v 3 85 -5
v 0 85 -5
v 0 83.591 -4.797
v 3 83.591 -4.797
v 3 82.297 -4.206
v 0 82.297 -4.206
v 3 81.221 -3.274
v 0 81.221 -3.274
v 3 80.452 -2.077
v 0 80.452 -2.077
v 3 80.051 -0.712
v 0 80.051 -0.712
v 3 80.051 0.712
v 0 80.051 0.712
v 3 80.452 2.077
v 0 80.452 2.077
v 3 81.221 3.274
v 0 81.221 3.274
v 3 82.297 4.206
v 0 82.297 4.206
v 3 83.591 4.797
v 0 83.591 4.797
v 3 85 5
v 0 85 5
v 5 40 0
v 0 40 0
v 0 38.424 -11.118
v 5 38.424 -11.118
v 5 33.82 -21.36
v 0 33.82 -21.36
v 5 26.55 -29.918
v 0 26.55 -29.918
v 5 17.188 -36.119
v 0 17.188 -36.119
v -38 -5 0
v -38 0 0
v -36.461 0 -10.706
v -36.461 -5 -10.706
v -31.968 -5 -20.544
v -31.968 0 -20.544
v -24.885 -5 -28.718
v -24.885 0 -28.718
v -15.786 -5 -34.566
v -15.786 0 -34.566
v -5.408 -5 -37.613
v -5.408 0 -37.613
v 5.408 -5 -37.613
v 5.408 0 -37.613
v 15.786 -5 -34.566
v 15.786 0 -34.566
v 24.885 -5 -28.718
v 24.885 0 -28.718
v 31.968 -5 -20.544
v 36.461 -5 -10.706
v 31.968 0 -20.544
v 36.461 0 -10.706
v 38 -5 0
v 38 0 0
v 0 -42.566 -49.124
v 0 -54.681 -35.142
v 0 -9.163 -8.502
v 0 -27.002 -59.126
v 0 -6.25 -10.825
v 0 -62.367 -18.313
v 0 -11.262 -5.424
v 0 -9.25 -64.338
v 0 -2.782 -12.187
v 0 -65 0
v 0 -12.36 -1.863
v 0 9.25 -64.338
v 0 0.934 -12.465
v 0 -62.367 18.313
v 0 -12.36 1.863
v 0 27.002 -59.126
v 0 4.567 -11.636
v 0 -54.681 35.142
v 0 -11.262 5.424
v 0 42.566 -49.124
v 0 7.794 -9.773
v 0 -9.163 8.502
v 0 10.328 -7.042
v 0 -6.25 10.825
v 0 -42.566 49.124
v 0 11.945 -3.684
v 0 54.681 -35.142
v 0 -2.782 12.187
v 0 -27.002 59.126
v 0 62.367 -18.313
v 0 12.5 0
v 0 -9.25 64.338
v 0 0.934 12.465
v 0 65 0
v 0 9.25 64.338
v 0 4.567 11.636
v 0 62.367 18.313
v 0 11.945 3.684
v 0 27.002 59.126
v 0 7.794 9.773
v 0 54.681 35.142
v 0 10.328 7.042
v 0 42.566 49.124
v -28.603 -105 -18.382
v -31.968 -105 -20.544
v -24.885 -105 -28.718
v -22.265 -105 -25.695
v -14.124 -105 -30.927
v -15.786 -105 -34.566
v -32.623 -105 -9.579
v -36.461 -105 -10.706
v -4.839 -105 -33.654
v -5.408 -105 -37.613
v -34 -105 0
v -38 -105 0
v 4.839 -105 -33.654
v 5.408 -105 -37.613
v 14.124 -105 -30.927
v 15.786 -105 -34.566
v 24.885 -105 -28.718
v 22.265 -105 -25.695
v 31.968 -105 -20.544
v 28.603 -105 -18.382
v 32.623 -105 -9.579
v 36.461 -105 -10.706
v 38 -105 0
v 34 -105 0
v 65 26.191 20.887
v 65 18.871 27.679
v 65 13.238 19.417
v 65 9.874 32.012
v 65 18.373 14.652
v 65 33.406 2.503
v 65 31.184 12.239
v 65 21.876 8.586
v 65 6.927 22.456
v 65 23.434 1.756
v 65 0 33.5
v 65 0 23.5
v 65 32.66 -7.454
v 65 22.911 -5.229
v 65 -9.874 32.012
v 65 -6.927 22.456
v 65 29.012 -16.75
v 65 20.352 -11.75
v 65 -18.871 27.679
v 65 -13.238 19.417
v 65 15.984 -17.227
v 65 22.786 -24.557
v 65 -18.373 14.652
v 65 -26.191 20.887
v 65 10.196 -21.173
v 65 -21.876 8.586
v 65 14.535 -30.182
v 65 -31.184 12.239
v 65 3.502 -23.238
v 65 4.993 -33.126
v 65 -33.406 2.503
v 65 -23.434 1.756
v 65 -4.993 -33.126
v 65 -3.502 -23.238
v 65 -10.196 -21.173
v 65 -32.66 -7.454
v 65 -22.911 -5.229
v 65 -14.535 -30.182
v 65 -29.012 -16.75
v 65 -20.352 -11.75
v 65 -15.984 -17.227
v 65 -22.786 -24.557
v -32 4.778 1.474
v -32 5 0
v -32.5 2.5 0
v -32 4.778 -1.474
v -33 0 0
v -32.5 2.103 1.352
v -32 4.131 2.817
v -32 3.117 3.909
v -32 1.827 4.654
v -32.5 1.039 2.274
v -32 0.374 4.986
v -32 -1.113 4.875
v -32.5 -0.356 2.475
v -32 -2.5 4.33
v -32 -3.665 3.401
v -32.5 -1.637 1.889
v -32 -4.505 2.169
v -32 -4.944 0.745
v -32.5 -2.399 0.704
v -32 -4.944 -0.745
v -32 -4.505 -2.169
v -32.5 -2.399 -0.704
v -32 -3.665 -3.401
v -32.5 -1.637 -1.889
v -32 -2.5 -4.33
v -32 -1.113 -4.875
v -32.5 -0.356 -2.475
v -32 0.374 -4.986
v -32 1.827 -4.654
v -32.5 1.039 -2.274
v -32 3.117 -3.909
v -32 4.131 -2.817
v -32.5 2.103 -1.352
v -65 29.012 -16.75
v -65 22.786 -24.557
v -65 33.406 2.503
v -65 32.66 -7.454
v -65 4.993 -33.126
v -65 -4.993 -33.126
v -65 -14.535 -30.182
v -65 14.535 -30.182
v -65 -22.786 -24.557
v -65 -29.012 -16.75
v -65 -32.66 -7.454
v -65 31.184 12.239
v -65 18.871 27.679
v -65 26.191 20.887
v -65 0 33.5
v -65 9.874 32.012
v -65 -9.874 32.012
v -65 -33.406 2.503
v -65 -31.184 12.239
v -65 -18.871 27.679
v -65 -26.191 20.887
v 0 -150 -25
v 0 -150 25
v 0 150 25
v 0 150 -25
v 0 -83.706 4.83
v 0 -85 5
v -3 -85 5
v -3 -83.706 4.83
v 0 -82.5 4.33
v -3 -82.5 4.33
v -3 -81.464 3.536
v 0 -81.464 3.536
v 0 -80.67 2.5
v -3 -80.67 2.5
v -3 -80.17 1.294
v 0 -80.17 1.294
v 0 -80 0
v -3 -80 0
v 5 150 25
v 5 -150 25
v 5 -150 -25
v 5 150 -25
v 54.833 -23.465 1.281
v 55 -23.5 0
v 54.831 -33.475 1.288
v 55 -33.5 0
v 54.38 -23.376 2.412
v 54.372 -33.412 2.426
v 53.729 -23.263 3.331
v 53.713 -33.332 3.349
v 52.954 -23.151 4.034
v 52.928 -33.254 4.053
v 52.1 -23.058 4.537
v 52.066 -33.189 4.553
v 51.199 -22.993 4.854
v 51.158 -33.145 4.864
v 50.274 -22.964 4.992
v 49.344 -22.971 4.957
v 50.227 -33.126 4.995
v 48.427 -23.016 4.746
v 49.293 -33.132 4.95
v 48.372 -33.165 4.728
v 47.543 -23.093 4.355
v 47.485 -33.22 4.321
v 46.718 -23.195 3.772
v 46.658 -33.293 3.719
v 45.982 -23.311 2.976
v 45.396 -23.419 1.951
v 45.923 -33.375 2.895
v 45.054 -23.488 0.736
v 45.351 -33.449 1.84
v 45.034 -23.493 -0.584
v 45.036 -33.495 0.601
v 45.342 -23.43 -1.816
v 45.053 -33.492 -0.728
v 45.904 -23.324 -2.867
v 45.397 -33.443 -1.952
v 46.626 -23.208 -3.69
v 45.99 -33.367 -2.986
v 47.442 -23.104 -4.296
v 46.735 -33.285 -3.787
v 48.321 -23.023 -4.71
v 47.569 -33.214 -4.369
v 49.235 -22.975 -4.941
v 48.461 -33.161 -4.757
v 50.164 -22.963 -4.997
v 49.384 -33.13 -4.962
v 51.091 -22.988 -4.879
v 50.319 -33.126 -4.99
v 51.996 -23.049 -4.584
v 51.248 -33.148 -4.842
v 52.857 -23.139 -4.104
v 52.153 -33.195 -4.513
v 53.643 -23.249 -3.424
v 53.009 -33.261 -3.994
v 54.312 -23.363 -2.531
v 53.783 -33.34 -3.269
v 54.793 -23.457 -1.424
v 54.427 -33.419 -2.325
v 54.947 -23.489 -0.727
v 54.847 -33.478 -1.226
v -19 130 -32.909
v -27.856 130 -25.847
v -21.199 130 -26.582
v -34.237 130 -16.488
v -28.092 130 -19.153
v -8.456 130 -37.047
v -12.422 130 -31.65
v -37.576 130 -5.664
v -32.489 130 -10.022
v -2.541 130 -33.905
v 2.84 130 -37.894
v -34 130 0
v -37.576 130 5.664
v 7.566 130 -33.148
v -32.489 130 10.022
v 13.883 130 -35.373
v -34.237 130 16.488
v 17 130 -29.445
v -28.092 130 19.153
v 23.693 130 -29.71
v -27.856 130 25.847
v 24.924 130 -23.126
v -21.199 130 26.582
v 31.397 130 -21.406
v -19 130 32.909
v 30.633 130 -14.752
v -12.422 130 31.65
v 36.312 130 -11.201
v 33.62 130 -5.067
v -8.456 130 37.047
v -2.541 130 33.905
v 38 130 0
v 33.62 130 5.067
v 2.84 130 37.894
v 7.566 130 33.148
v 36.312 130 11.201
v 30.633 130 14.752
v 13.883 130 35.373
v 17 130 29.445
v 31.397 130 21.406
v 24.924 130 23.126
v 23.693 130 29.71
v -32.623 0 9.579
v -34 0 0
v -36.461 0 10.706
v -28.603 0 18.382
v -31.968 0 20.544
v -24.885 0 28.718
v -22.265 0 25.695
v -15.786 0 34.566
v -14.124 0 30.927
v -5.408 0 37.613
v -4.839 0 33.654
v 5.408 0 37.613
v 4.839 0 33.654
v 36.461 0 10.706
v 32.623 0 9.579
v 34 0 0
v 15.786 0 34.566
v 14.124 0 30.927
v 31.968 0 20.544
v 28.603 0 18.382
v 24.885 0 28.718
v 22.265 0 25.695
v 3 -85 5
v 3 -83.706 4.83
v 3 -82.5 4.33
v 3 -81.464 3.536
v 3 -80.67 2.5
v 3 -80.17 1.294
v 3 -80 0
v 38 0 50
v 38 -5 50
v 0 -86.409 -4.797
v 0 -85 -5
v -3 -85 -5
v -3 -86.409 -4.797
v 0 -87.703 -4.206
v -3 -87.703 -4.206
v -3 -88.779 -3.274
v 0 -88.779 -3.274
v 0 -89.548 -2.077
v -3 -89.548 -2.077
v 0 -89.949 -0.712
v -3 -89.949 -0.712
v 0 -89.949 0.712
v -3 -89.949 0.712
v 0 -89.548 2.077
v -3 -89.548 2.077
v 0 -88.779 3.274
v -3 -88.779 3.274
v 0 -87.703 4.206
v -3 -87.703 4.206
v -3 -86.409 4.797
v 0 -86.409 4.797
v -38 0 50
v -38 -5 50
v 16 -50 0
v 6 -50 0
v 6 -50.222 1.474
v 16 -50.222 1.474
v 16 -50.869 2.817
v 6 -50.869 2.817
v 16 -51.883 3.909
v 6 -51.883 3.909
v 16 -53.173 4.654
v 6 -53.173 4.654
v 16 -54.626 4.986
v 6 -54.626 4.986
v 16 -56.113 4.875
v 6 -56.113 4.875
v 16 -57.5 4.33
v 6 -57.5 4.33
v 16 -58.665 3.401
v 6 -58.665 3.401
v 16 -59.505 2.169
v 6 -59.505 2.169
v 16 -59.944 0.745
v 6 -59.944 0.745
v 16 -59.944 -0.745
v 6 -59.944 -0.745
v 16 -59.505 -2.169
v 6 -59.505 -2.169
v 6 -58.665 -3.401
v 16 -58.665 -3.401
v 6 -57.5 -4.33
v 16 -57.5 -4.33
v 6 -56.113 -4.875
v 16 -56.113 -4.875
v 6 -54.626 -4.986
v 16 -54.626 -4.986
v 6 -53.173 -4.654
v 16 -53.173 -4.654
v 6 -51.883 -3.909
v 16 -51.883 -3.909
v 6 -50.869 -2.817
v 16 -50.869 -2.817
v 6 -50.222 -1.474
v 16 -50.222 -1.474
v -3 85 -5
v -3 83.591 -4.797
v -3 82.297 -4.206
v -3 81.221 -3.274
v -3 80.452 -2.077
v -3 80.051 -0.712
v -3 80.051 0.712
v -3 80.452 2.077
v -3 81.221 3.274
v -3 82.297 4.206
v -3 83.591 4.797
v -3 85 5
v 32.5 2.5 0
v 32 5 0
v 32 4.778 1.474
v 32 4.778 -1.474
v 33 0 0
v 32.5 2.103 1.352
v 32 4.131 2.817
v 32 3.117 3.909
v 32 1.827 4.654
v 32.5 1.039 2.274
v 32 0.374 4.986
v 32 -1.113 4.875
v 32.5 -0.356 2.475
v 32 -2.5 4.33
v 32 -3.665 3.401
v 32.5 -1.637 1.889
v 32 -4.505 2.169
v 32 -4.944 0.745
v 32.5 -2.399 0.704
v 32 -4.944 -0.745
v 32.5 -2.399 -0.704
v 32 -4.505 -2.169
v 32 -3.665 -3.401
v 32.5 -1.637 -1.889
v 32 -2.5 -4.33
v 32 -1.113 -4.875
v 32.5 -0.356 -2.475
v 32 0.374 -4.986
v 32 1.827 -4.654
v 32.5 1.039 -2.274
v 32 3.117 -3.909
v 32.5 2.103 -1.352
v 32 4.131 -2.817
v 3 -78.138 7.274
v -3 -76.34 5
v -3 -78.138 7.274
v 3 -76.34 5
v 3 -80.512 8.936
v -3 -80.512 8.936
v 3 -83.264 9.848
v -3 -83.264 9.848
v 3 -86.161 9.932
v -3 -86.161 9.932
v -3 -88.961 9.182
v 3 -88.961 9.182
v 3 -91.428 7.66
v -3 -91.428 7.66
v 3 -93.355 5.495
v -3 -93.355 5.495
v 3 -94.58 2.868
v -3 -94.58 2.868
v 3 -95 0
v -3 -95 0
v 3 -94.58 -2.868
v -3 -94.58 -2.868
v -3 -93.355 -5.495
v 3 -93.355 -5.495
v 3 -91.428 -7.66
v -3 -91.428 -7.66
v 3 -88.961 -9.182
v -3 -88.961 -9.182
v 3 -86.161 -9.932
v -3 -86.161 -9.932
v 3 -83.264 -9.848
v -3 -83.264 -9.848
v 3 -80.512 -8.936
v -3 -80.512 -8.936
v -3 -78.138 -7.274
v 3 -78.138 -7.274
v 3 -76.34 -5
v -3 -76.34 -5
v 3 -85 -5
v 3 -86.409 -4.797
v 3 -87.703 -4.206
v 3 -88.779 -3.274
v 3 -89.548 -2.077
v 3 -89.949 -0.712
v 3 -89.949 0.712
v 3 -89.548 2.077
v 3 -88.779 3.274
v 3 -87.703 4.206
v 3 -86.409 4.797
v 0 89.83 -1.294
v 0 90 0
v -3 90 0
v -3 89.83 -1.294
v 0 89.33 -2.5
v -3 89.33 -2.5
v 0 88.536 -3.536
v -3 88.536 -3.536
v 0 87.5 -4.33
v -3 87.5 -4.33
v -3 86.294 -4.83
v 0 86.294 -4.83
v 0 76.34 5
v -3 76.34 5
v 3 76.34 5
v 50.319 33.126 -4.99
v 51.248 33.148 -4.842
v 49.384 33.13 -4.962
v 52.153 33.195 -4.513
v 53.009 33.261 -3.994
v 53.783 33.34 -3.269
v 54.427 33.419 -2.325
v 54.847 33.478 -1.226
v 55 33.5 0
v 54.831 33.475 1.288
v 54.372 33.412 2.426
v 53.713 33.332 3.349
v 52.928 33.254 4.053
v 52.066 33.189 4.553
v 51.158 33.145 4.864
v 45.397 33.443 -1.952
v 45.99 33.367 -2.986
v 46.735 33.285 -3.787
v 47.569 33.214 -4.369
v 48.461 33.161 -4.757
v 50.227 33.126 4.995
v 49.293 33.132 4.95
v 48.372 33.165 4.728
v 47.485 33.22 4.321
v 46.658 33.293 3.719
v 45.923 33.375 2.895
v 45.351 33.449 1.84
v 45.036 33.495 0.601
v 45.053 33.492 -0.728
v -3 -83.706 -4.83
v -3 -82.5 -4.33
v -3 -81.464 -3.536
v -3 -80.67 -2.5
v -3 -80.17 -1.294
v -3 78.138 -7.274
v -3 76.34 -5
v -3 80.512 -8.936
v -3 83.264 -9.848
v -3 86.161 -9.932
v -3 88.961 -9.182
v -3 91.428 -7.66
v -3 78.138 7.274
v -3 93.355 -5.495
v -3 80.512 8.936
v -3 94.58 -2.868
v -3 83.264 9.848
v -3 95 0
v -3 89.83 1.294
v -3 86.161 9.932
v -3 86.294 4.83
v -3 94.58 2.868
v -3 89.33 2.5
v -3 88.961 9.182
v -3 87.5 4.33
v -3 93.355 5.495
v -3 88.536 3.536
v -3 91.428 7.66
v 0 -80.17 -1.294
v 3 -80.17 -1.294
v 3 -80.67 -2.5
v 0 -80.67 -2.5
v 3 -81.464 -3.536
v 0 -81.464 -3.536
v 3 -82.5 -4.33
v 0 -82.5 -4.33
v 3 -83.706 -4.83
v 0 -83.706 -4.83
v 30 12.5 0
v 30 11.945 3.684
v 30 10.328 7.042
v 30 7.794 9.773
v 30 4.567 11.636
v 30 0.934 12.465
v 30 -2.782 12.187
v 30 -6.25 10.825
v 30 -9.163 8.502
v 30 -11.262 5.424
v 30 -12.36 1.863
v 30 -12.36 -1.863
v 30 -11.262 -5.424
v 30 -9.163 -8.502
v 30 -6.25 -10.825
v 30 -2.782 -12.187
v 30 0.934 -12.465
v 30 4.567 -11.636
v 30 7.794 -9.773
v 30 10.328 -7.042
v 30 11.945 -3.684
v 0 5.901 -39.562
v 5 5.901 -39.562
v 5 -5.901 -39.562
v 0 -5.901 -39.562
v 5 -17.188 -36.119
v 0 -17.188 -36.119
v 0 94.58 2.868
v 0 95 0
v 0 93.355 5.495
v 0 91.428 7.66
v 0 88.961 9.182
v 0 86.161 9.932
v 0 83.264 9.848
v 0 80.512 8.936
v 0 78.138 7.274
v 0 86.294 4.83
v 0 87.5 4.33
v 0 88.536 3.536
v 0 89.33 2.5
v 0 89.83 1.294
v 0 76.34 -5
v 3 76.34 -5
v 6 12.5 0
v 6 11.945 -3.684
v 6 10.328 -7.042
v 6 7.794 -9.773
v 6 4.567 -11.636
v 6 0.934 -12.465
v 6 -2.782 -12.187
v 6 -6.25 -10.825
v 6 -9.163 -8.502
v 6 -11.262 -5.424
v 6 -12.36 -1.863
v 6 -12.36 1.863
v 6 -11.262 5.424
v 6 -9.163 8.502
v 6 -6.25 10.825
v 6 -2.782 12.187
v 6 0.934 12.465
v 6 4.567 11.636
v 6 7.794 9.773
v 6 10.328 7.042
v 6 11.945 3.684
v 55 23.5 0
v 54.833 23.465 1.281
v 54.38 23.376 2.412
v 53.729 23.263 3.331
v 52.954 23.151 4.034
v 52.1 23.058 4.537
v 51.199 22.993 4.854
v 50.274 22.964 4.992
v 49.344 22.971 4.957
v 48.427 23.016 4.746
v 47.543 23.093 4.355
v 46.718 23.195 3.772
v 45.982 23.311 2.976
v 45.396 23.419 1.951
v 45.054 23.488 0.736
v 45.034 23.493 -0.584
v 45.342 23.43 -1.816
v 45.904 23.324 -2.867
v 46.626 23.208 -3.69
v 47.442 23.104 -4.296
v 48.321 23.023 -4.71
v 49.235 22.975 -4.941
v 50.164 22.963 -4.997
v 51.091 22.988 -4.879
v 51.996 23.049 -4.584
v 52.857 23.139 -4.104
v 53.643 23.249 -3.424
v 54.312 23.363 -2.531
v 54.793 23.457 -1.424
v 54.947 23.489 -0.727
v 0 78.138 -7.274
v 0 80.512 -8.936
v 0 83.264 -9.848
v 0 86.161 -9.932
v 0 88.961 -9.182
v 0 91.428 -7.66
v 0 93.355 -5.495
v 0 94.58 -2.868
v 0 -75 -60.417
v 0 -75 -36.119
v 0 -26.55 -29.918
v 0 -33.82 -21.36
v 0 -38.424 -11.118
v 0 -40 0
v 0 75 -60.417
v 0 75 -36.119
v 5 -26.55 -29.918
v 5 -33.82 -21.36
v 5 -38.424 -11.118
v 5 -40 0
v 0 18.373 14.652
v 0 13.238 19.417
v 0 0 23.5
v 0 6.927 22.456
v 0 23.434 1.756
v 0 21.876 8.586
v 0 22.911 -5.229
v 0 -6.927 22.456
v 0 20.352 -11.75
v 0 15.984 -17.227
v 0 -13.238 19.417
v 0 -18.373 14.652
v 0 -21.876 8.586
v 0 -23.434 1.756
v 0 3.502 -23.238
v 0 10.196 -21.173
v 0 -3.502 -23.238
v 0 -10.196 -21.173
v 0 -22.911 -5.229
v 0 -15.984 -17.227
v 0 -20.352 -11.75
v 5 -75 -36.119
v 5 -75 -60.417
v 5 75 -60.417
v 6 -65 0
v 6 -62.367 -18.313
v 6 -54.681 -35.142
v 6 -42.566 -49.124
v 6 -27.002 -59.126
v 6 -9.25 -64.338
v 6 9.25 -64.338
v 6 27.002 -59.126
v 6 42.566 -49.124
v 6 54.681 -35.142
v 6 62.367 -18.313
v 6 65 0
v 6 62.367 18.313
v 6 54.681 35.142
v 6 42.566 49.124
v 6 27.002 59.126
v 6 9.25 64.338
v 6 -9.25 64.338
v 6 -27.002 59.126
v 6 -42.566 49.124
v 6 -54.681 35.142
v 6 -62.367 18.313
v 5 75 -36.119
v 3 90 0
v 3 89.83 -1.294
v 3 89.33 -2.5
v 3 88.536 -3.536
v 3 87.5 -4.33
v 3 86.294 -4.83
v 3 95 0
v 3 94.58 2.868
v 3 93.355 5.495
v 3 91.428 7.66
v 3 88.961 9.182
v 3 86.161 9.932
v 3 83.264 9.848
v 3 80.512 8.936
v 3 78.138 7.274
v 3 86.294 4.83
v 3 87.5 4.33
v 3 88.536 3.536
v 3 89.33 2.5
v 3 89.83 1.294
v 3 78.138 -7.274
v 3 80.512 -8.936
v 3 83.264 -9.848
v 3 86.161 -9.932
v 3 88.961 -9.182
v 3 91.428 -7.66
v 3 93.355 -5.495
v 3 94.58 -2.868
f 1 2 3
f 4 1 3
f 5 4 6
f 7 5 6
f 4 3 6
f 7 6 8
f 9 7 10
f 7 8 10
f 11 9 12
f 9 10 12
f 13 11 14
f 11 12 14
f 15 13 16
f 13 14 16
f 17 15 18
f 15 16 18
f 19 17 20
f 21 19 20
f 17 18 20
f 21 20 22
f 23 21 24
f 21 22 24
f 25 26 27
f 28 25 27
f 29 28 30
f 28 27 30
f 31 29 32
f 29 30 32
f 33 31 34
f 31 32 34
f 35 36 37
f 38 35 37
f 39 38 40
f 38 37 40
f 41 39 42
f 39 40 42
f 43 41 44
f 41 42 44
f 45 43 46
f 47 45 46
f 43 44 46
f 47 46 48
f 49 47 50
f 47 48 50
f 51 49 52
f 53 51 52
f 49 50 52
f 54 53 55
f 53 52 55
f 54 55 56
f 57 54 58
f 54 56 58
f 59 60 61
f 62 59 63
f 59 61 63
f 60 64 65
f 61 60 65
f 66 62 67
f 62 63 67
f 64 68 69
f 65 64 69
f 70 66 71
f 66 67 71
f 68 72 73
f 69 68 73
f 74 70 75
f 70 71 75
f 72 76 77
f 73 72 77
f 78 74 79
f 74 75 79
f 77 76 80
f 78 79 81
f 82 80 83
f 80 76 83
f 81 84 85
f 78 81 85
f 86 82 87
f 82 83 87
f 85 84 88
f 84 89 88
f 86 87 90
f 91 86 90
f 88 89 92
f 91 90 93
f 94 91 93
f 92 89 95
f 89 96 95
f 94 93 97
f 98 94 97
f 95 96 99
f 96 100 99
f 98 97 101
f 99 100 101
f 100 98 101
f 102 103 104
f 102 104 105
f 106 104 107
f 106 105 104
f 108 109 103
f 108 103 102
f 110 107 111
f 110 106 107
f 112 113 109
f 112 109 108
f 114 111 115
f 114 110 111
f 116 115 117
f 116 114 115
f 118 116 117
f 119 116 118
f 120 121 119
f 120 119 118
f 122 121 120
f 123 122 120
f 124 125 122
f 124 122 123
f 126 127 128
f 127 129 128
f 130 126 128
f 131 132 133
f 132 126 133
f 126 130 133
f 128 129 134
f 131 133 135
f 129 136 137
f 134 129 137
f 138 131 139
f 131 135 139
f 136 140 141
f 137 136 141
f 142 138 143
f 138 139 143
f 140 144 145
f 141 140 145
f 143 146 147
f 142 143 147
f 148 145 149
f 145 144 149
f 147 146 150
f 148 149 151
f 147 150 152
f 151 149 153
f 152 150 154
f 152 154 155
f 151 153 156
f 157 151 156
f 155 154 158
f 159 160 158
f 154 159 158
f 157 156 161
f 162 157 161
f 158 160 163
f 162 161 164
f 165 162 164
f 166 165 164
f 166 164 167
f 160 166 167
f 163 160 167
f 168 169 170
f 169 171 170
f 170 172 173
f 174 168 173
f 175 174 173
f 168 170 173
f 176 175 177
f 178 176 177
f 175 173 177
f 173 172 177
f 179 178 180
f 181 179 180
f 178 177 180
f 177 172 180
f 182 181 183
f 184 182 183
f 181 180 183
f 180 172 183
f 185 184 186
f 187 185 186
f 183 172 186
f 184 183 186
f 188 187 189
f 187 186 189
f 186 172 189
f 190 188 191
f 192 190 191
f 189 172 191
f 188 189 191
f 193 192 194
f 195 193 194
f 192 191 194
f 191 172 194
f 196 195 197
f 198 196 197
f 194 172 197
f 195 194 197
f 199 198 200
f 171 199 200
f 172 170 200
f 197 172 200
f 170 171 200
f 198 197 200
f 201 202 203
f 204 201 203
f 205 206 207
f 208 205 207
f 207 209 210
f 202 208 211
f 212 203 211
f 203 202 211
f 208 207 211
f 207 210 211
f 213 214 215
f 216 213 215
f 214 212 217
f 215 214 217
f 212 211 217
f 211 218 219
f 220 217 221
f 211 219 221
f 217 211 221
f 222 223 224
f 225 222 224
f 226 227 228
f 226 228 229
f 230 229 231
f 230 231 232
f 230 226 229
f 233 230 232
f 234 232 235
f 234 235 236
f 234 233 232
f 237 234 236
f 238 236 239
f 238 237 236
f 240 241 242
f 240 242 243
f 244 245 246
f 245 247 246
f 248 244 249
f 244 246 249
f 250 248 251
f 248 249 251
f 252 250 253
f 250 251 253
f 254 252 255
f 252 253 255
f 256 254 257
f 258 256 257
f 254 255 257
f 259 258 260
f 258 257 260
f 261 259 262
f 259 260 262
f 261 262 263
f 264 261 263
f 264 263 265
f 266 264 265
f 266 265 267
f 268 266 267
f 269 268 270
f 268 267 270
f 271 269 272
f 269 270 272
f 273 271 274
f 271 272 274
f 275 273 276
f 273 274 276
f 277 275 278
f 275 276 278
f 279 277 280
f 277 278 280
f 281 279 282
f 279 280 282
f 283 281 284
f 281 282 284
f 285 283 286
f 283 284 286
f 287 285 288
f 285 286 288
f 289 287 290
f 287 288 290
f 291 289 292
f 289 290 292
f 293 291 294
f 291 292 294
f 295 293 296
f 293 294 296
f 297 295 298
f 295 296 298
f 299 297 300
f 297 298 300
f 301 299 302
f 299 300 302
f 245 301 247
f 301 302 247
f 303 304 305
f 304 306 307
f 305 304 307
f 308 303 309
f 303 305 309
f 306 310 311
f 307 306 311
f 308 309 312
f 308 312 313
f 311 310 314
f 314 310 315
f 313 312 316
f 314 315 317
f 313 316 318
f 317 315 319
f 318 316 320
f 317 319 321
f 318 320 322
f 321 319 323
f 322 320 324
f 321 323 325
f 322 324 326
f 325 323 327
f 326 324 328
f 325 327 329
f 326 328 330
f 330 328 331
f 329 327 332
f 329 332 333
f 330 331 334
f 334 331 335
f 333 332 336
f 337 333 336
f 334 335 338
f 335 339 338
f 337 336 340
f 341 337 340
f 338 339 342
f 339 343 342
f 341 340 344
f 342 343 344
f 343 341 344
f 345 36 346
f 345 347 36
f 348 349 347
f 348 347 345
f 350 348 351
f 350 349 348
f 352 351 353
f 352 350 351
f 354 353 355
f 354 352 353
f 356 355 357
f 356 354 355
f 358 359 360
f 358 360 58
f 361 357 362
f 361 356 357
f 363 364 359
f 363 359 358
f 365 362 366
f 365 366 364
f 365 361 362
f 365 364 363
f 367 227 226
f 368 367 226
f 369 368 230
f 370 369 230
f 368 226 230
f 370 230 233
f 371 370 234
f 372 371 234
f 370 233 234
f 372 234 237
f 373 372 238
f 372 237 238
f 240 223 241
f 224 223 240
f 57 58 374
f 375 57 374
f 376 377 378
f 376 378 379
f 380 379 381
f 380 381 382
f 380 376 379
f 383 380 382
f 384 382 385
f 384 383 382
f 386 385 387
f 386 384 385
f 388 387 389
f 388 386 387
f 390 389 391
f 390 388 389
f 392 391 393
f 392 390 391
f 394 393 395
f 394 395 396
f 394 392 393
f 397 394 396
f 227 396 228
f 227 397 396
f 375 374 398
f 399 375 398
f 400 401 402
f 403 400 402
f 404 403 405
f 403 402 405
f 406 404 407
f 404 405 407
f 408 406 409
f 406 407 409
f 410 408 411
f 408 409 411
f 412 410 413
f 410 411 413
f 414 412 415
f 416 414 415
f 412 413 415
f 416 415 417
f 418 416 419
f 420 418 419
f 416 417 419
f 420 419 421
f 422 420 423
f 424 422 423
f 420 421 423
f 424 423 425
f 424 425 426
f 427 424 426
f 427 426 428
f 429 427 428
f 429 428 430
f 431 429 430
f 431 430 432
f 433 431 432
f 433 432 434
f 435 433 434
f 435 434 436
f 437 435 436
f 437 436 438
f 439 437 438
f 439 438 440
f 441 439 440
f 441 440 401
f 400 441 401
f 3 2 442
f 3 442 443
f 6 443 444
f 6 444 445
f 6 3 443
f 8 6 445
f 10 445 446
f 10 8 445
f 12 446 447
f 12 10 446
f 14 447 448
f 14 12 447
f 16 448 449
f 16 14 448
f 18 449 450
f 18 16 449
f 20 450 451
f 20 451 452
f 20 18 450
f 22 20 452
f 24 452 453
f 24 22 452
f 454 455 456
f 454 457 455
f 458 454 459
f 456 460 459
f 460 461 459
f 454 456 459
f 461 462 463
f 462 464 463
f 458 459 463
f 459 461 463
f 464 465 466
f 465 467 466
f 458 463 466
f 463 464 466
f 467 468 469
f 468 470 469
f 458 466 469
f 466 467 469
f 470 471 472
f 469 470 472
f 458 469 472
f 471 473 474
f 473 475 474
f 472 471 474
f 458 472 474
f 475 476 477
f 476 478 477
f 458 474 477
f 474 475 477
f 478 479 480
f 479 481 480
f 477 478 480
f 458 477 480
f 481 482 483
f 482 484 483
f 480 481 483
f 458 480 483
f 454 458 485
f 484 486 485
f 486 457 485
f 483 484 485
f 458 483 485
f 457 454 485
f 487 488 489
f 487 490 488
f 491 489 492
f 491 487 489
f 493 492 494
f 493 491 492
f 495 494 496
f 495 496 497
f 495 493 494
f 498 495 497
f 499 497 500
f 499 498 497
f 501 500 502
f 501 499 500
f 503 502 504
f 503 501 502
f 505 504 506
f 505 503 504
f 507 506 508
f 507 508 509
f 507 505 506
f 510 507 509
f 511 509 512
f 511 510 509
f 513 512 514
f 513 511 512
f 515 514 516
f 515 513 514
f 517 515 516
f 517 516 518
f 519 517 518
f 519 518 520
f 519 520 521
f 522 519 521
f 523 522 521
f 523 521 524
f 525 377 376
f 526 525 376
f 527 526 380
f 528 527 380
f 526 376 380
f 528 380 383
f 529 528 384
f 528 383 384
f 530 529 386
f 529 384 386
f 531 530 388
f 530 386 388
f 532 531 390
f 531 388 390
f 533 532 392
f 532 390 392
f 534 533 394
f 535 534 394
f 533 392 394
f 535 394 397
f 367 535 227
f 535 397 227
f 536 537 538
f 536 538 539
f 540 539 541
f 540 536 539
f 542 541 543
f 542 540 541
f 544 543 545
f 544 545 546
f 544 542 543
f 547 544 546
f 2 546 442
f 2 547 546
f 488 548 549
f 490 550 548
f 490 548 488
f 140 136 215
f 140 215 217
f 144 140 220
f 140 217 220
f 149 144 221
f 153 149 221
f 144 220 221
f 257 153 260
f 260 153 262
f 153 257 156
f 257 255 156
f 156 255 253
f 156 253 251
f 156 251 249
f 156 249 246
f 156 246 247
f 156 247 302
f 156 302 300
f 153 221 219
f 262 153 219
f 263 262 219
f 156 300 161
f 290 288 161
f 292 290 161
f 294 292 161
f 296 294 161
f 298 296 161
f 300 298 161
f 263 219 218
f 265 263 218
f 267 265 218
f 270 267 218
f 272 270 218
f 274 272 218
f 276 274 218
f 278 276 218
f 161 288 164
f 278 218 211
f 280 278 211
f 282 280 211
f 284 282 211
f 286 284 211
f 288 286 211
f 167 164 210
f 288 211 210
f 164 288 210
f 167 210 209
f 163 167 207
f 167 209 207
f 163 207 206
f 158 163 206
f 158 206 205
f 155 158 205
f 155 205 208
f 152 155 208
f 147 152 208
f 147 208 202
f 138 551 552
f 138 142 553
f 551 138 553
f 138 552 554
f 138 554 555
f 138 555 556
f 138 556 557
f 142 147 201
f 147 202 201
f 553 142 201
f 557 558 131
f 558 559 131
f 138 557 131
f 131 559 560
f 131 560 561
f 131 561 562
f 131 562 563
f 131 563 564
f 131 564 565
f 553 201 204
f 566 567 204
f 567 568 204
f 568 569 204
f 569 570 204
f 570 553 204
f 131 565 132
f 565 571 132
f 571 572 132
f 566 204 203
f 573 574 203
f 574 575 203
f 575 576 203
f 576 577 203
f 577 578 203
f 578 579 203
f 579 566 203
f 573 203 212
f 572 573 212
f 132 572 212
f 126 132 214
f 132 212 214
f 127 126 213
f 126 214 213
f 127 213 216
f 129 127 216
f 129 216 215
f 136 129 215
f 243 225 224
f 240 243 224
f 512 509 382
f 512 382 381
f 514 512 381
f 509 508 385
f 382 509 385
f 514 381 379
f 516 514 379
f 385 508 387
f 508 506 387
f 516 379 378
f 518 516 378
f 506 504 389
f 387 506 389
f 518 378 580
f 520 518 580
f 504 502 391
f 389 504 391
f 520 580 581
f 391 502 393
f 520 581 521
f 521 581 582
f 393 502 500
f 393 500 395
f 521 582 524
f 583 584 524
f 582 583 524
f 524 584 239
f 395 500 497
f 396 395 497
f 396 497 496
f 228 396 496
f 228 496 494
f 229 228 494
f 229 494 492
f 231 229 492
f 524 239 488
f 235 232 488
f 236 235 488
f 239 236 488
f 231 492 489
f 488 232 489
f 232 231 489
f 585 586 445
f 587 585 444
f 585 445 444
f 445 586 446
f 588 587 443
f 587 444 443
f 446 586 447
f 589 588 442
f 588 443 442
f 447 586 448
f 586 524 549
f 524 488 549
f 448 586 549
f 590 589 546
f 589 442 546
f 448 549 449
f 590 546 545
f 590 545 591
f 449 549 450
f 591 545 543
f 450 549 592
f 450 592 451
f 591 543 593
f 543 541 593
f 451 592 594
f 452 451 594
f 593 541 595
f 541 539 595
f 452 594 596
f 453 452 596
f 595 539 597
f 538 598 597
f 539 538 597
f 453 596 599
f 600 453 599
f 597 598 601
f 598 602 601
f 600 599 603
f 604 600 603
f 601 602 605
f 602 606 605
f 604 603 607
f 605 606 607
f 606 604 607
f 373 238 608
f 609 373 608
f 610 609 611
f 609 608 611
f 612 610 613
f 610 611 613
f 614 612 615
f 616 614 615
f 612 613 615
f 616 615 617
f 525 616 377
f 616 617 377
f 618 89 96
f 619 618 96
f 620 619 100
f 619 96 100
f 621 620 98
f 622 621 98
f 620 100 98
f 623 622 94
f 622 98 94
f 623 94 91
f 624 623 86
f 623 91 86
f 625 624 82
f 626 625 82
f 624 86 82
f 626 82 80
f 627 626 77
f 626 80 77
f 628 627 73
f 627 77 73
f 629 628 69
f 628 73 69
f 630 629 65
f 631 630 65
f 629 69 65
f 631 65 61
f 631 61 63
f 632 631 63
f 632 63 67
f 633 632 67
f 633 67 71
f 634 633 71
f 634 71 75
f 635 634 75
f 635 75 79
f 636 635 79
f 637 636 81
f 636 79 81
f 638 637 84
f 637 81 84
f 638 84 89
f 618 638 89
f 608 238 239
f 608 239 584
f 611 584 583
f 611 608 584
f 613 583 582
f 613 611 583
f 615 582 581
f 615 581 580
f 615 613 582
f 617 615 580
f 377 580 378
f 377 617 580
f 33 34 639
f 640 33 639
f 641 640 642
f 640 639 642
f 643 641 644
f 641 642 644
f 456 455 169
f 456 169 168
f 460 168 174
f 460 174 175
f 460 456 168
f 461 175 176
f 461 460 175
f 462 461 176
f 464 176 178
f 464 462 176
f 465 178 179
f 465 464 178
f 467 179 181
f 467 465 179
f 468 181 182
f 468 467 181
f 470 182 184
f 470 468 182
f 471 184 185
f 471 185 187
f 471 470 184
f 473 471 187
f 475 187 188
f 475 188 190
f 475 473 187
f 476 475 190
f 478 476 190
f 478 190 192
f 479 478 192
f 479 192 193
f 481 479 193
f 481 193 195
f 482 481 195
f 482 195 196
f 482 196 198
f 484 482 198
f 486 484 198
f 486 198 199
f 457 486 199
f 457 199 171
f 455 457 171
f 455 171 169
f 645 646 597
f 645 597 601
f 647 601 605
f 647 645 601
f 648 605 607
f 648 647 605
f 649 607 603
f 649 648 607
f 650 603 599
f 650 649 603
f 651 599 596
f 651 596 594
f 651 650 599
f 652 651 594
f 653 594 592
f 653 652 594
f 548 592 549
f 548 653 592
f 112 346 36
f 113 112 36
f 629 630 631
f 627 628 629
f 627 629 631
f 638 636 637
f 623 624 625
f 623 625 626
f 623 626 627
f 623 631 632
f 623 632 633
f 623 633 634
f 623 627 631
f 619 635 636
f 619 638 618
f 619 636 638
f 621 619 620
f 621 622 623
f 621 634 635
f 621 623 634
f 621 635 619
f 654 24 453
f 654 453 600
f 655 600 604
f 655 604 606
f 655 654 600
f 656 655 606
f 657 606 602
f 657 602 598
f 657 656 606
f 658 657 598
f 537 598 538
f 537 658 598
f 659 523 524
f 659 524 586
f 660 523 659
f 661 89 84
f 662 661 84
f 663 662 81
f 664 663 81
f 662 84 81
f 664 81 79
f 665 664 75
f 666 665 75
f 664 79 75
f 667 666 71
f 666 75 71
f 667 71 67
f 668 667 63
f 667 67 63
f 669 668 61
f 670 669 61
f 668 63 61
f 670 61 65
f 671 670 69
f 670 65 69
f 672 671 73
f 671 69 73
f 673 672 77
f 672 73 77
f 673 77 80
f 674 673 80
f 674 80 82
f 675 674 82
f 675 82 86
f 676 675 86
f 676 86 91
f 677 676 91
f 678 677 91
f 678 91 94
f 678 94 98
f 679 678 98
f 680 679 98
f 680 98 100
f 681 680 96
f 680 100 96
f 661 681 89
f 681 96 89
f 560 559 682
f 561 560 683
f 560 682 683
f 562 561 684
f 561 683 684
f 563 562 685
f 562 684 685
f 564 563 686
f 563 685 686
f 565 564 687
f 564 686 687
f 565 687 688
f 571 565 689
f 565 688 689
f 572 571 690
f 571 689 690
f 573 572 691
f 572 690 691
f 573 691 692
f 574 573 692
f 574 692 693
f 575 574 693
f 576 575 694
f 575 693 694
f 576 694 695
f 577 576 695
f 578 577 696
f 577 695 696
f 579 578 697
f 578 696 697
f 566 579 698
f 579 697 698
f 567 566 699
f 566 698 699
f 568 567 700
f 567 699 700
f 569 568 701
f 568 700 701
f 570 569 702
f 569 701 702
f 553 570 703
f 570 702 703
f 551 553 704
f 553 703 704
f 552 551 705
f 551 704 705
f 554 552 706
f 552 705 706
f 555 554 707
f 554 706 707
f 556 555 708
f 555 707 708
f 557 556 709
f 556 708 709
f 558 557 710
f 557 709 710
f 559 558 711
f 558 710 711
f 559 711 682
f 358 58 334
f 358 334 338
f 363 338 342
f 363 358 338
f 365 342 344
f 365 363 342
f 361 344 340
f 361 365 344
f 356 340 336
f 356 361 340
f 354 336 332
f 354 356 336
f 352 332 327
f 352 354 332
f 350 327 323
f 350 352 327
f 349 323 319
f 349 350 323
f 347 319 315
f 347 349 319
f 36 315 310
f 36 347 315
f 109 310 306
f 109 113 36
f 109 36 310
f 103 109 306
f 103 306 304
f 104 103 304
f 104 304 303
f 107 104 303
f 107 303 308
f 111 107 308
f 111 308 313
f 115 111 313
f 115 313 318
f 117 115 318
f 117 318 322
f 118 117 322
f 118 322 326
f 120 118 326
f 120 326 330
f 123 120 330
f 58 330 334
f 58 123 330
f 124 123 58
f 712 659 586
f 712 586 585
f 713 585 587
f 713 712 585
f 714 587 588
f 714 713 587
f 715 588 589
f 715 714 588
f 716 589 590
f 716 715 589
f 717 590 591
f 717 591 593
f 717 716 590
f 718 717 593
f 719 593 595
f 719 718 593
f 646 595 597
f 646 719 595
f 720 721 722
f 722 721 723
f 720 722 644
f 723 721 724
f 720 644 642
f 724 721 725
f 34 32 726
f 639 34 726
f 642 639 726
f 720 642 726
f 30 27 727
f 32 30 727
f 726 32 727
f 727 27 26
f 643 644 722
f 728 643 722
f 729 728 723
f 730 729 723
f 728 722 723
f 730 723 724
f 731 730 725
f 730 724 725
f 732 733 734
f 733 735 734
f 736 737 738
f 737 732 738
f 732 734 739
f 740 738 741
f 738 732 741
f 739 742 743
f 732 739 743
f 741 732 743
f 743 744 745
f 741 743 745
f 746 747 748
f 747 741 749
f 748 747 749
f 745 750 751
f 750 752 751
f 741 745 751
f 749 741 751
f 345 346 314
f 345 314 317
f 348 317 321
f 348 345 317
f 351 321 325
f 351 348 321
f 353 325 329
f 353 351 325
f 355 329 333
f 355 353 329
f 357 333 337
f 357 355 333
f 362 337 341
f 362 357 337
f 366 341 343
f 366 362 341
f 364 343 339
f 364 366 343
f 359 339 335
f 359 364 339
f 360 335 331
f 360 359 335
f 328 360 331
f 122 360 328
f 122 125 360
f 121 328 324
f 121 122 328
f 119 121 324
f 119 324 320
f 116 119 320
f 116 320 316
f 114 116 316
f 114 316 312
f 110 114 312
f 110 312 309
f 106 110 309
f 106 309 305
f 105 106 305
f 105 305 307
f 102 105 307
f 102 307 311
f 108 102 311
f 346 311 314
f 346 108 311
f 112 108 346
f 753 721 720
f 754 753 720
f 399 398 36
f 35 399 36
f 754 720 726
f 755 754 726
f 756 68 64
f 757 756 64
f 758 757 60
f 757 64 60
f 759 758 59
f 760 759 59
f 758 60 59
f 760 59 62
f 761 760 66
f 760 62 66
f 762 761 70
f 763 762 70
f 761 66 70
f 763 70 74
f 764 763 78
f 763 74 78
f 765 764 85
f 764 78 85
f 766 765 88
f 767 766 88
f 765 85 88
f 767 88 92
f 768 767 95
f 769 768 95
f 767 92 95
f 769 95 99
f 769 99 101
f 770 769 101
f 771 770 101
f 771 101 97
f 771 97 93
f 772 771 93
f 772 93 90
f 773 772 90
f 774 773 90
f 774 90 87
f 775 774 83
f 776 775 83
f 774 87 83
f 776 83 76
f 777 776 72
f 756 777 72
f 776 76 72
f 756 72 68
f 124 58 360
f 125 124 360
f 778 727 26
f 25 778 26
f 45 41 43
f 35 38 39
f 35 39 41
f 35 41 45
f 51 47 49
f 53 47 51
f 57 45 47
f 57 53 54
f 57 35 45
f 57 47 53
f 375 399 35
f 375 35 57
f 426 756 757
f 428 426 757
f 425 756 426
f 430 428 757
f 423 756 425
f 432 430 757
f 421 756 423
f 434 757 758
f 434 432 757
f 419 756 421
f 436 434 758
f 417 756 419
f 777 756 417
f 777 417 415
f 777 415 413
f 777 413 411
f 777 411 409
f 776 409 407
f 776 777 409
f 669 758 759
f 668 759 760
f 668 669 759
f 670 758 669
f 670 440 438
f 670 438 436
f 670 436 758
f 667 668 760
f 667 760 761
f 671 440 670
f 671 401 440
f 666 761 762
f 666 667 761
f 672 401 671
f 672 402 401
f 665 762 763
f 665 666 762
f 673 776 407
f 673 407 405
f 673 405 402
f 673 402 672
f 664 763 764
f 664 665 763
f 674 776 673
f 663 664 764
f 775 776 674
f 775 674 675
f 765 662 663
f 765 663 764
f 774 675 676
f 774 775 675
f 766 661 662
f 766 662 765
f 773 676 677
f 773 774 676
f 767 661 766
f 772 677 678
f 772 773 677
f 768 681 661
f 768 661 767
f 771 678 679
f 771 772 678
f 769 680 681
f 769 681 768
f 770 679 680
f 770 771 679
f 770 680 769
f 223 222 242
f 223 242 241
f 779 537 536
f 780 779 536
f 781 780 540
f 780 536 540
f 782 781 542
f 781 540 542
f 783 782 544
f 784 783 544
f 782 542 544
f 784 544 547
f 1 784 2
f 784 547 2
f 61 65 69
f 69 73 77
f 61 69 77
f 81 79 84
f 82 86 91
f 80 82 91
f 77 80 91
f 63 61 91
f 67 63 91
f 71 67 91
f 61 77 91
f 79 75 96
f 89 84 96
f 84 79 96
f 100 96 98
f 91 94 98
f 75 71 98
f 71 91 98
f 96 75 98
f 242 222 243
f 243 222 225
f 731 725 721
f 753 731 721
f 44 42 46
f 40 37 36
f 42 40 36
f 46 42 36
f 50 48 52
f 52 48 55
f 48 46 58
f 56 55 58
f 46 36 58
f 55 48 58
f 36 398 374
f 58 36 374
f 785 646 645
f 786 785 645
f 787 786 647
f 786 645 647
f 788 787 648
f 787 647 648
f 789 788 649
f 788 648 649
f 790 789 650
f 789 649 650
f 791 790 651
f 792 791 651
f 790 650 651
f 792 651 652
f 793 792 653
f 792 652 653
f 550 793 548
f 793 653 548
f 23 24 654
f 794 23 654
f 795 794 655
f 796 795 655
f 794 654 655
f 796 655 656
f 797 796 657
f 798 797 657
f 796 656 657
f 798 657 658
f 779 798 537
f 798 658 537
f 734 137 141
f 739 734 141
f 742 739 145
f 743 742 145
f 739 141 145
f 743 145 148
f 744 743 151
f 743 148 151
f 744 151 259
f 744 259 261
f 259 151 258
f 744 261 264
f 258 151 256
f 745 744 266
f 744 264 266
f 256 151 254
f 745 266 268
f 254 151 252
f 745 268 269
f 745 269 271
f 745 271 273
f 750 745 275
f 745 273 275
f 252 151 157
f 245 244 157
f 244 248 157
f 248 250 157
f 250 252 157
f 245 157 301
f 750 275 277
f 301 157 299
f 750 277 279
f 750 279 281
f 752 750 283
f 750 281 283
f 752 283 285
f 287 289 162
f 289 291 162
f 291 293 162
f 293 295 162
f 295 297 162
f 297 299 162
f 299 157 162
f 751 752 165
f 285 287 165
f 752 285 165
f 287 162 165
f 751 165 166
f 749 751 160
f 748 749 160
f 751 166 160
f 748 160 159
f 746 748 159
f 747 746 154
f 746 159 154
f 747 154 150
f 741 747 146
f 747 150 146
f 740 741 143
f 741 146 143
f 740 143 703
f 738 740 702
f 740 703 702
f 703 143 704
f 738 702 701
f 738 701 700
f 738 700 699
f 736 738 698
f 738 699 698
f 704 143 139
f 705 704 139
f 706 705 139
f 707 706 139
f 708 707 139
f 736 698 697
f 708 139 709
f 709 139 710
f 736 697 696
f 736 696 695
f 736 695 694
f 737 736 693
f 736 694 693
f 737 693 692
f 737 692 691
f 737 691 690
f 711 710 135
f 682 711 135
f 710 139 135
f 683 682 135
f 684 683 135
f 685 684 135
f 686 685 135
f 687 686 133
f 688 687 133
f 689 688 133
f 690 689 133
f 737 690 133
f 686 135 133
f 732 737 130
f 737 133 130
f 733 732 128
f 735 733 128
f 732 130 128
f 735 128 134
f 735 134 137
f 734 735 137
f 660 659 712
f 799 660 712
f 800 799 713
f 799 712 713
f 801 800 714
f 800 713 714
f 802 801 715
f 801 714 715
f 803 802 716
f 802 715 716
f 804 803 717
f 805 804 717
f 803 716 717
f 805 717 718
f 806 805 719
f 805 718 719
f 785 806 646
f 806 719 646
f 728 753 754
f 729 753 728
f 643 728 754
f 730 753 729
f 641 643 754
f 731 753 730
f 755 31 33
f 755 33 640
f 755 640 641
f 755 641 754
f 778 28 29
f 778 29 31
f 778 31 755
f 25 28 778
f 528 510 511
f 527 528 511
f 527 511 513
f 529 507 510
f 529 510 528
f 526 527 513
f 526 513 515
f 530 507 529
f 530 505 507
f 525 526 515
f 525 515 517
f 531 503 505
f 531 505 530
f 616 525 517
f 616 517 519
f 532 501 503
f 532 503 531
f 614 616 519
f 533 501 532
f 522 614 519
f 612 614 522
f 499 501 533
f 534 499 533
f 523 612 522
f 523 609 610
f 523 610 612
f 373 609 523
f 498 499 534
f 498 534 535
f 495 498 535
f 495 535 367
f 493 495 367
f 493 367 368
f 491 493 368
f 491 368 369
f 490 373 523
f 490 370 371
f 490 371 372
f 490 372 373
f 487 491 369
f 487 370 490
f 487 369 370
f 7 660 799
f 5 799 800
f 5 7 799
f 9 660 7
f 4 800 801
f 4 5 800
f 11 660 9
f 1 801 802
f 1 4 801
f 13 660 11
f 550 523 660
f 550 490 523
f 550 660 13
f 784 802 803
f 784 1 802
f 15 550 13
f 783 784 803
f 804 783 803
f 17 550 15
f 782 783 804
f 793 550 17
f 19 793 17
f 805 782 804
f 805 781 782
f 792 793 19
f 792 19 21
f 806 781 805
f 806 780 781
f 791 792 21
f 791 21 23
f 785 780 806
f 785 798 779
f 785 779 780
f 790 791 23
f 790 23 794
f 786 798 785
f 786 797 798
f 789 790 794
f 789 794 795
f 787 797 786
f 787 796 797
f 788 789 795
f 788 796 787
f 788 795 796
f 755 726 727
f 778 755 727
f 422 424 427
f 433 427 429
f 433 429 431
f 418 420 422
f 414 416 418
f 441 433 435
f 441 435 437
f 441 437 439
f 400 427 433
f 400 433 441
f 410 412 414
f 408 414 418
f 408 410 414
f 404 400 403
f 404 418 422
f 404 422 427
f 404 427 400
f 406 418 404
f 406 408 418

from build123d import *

# Parameters (mm, degrees)
F1_DEPTH  = 105
F2_DEPTH  = 130
F4_DEPTH  = 5
F5_W      = 65
F5_H      = 10
F7_DEPTH  = 34
F9_DEPTH  = 6
F10_DEPTH = 16
F11_R     = 5
F12_DEPTH = 33
F13_SIZE2 = 1
F13_SIZE  = 5
F14_SIZE2 = 5
F14_SIZE  = 1
F16_DEPTH = 3
F17_R     = 12.5
F18_DEPTH = 30
F19_W     = 300
F19_H     = 50
F20_DEPTH = 5
F22_DEPTH = 5


# Not quite as in the source:
# - a feature names something its author has since deleted; it is built from what else it names


with BuildPart() as f1:
    # F0 (on Front) → F1 (new body)
    with BuildSketch(Plane.XZ):
        with BuildLine():
            Line((38, 0), (34, 0))
            ThreePointArc((34, 0), (0, -34), (-34, 0))
            Line((-34, 0), (-38, 0))
            ThreePointArc((-38, 0), (0, -38), (38, 0))
        make_face()
    extrude(amount=F1_DEPTH)

    # F0 (on Front) → F2 (join)
    with BuildSketch(Plane.XZ):
        with BuildLine():
            Line((38, 0), (34, 0))
            ThreePointArc((34, 0), (0, -34), (-34, 0))
            Line((-34, 0), (-38, 0))
            ThreePointArc((-38, 0), (0, -38), (38, 0))
        make_face()
        with BuildLine():
            ThreePointArc((-34, 0), (0, 34), (34, 0))
            Line((34, 0), (38, 0))
            ThreePointArc((38, 0), (0, 38), (-38, 0))
            Line((-38, 0), (-34, 0))
        make_face()
    extrude(amount=-F2_DEPTH)


with BuildPart() as f4:
    # F3 (on Front) → F4 (new body)
    with BuildSketch(Plane.XZ):
        with BuildLine():
            ThreePointArc((-38, 0), (0, 38), (38, 0))
            Line((38, 0), (38, 50))
            Line((38, 50), (-38, 50))
            Line((-38, 50), (-38, 0))
        make_face()
        with BuildLine():
            ThreePointArc((-38, 0), (0, -38), (38, 0))
            Line((38, 0), (-38, 0))
        make_face()
        with BuildLine():
            Line((-38, 0), (38, 0))
            ThreePointArc((38, 0), (0, 38), (-38, 0))
        make_face()
    extrude(amount=F4_DEPTH)


with BuildPart() as f6:
    # F5 (on Front) → F6 (revolve)
    with BuildSketch(Plane.XZ):
        with Locations((32.5, 28.5)):
            Rectangle(F5_W, F5_H)
        Polygon((0, 23.5), (0, 33.5), (-65, 33.5), (-65, 0), (0, 0), align=None)
    revolve(axis=Axis((0, 0, 0), (1, 0, 0)))

    # F5 (on Front) → F7 (cut, symmetric)
    with BuildSketch(Plane.XZ):
        with BuildLine():
            ThreePointArc((45, 0), (50, -5), (55, 0))
            Line((55, 0), (45, 0))
        make_face()
        with BuildLine():
            Line((45, 0), (55, 0))
            ThreePointArc((55, 0), (50, 5), (45, 0))
        make_face()
    extrude(amount=F7_DEPTH, both=True, mode=Mode.SUBTRACT)


with BuildPart() as f9:
    # F8 (on Right) → F9 (new body)
    with BuildSketch(Plane.YZ):
        with BuildLine():
            Line((12.5, 0), (65, 0))
            ThreePointArc((65, 0), (0, 65), (-65, 0))
            Line((-65, 0), (-60, 0))
            ThreePointArc((-60, 0), (-55, 5), (-50, 0))
            Line((-50, 0), (-12.5, 0))
            ThreePointArc((-12.5, 0), (0, 12.5), (12.5, 0))
        make_face()
        with BuildLine():
            ThreePointArc((-65, 0), (0, -65), (65, 0))
            Line((65, 0), (12.5, 0))
            ThreePointArc((12.5, 0), (0, -12.5), (-12.5, 0))
            Line((-12.5, 0), (-50, 0))
            ThreePointArc((-50, 0), (-55, -5), (-60, 0))
            Line((-60, 0), (-65, 0))
        make_face()
    extrude(amount=F9_DEPTH)

    # F8 (on Right) → F10 (join)
    with BuildSketch(Plane.YZ):
        with BuildLine():
            Line((-50, 0), (-60, 0))
            ThreePointArc((-60, 0), (-55, -5), (-50, 0))
        make_face()
        with BuildLine():
            ThreePointArc((-50, 0), (-55, 5), (-60, 0))
            Line((-60, 0), (-50, 0))
        make_face()
    extrude(amount=F10_DEPTH)


with BuildPart() as f12:
    # F11 (on Right) → F12 (new body, symmetric)
    with BuildSketch(Plane.YZ):
        Circle(F11_R)
    extrude(amount=F12_DEPTH, both=True)

    # F13
    f13_edges = [f12.edges().sort_by_distance(p)[0] for p in [
        (33, -5, 0),
    ]]
    f13_side = f12.faces().sort_by_distance((33, 0, 0))[0]
    chamfer(f13_edges, length=F13_SIZE, length2=F13_SIZE2, reference=f13_side)

    # F14
    f14_edges = [f12.edges().sort_by_distance(p)[0] for p in [
        (-33, -5, 0),
    ]]
    chamfer(f14_edges, length=F14_SIZE, length2=F14_SIZE2)


with BuildPart() as f16:
    # F15 (on Right) → F16 (new body, symmetric)
    with BuildSketch(Plane.YZ):
        with BuildLine():
            Line((-85, 5), (-76.3397459622, 5))
            ThreePointArc((-76.3397459622, 5), (-95, 0), (-76.3397459622, -5))
            Line((-76.3397459622, -5), (-85, -5))
            ThreePointArc((-85, -5), (-90, 0), (-85, 5))
        make_face()
        with BuildLine():
            ThreePointArc((-75, 0), (-75.3407417371, 2.588190451), (-76.3397459622, 5))
            Line((-76.3397459622, 5), (-85, 5))
            ThreePointArc((-85, 5), (-81.4644660941, 3.5355339059), (-80, 0))
            ThreePointArc((-80, 0), (-81.4644660941, -3.5355339059), (-85, -5))
            Line((-85, -5), (-76.3397459622, -5))
            ThreePointArc((-76.3397459622, -5), (-75.3407417371, -2.588190451), (-75, 0))
        make_face()
        with BuildLine():
            ThreePointArc((76.3397459622, -5), (75, 0), (76.3397459622, 5))
            Line((76.3397459622, 5), (-76.3397459622, 5))
            ThreePointArc((-76.3397459622, 5), (-75.3407417371, 2.588190451), (-75, 0))
            ThreePointArc((-75, 0), (-75.3407417371, -2.588190451), (-76.3397459622, -5))
            Line((-76.3397459622, -5), (76.3397459622, -5))
        make_face()
        with BuildLine():
            ThreePointArc((85, -5), (80, 0), (85, 5))
            Line((85, 5), (76.3397459622, 5))
            ThreePointArc((76.3397459622, 5), (75, 0), (76.3397459622, -5))
            Line((76.3397459622, -5), (85, -5))
        make_face()
        with BuildLine():
            Line((76.3397459622, 5), (85, 5))
            ThreePointArc((85, 5), (88.5355339059, 3.5355339059), (90, 0))
            ThreePointArc((90, 0), (88.5355339059, -3.5355339059), (85, -5))
            Line((85, -5), (76.3397459622, -5))
            ThreePointArc((76.3397459622, -5), (87.588190451, -9.6592582629), (95, 0))
            ThreePointArc((95, 0), (87.588190451, 9.6592582629), (76.3397459622, 5))
        make_face()
    extrude(amount=F16_DEPTH, both=True)


with BuildPart() as f18:
    # F17 (on Right) → F18 (new body)
    with BuildSketch(Plane.YZ):
        Circle(F17_R)
    extrude(amount=F18_DEPTH)


with BuildPart() as f20:
    # F19 (on Right) → F20 (new body)
    with BuildSketch(Plane.YZ):
        Rectangle(F19_W, F19_H)
    extrude(amount=F20_DEPTH)


with BuildPart() as f22:
    # F21 (on Right) → F22 (new body)
    with BuildSketch(Plane.YZ):
        with BuildLine():
            Line((75, -36.1188948154), (40, 0))
            ThreePointArc((40, 0), (33.8195045896, -21.3598012471), (17.1879445342, -36.1188948154))
            Line((17.1879445342, -36.1188948154), (75, -36.1188948154))
        make_face()
        with BuildLine():
            Line((75, -36.1188948154), (17.1879445342, -36.1188948154))
            ThreePointArc((17.1879445342, -36.1188948154), (0, -40), (-17.1879445342, -36.1188948154))
            Line((-17.1879445342, -36.1188948154), (-75, -36.1188948154))
            Line((-75, -36.1188948154), (-75, -60.4170560837))
            Line((-75, -60.4170560837), (75, -60.4170560837))
            Line((75, -60.4170560837), (75, -36.1188948154))
        make_face()
        with BuildLine():
            ThreePointArc((-17.1879445342, -36.1188948154), (-33.8195045896, -21.3598012471), (-40, 0))
            Line((-40, 0), (-75, -36.1188948154))
            Line((-75, -36.1188948154), (-17.1879445342, -36.1188948154))
        make_face()
    extrude(amount=F22_DEPTH)


solid = Compound([f1.part, f4.part, f6.part, f9.part, f12.part, f16.part, f18.part, f20.part, f22.part])
